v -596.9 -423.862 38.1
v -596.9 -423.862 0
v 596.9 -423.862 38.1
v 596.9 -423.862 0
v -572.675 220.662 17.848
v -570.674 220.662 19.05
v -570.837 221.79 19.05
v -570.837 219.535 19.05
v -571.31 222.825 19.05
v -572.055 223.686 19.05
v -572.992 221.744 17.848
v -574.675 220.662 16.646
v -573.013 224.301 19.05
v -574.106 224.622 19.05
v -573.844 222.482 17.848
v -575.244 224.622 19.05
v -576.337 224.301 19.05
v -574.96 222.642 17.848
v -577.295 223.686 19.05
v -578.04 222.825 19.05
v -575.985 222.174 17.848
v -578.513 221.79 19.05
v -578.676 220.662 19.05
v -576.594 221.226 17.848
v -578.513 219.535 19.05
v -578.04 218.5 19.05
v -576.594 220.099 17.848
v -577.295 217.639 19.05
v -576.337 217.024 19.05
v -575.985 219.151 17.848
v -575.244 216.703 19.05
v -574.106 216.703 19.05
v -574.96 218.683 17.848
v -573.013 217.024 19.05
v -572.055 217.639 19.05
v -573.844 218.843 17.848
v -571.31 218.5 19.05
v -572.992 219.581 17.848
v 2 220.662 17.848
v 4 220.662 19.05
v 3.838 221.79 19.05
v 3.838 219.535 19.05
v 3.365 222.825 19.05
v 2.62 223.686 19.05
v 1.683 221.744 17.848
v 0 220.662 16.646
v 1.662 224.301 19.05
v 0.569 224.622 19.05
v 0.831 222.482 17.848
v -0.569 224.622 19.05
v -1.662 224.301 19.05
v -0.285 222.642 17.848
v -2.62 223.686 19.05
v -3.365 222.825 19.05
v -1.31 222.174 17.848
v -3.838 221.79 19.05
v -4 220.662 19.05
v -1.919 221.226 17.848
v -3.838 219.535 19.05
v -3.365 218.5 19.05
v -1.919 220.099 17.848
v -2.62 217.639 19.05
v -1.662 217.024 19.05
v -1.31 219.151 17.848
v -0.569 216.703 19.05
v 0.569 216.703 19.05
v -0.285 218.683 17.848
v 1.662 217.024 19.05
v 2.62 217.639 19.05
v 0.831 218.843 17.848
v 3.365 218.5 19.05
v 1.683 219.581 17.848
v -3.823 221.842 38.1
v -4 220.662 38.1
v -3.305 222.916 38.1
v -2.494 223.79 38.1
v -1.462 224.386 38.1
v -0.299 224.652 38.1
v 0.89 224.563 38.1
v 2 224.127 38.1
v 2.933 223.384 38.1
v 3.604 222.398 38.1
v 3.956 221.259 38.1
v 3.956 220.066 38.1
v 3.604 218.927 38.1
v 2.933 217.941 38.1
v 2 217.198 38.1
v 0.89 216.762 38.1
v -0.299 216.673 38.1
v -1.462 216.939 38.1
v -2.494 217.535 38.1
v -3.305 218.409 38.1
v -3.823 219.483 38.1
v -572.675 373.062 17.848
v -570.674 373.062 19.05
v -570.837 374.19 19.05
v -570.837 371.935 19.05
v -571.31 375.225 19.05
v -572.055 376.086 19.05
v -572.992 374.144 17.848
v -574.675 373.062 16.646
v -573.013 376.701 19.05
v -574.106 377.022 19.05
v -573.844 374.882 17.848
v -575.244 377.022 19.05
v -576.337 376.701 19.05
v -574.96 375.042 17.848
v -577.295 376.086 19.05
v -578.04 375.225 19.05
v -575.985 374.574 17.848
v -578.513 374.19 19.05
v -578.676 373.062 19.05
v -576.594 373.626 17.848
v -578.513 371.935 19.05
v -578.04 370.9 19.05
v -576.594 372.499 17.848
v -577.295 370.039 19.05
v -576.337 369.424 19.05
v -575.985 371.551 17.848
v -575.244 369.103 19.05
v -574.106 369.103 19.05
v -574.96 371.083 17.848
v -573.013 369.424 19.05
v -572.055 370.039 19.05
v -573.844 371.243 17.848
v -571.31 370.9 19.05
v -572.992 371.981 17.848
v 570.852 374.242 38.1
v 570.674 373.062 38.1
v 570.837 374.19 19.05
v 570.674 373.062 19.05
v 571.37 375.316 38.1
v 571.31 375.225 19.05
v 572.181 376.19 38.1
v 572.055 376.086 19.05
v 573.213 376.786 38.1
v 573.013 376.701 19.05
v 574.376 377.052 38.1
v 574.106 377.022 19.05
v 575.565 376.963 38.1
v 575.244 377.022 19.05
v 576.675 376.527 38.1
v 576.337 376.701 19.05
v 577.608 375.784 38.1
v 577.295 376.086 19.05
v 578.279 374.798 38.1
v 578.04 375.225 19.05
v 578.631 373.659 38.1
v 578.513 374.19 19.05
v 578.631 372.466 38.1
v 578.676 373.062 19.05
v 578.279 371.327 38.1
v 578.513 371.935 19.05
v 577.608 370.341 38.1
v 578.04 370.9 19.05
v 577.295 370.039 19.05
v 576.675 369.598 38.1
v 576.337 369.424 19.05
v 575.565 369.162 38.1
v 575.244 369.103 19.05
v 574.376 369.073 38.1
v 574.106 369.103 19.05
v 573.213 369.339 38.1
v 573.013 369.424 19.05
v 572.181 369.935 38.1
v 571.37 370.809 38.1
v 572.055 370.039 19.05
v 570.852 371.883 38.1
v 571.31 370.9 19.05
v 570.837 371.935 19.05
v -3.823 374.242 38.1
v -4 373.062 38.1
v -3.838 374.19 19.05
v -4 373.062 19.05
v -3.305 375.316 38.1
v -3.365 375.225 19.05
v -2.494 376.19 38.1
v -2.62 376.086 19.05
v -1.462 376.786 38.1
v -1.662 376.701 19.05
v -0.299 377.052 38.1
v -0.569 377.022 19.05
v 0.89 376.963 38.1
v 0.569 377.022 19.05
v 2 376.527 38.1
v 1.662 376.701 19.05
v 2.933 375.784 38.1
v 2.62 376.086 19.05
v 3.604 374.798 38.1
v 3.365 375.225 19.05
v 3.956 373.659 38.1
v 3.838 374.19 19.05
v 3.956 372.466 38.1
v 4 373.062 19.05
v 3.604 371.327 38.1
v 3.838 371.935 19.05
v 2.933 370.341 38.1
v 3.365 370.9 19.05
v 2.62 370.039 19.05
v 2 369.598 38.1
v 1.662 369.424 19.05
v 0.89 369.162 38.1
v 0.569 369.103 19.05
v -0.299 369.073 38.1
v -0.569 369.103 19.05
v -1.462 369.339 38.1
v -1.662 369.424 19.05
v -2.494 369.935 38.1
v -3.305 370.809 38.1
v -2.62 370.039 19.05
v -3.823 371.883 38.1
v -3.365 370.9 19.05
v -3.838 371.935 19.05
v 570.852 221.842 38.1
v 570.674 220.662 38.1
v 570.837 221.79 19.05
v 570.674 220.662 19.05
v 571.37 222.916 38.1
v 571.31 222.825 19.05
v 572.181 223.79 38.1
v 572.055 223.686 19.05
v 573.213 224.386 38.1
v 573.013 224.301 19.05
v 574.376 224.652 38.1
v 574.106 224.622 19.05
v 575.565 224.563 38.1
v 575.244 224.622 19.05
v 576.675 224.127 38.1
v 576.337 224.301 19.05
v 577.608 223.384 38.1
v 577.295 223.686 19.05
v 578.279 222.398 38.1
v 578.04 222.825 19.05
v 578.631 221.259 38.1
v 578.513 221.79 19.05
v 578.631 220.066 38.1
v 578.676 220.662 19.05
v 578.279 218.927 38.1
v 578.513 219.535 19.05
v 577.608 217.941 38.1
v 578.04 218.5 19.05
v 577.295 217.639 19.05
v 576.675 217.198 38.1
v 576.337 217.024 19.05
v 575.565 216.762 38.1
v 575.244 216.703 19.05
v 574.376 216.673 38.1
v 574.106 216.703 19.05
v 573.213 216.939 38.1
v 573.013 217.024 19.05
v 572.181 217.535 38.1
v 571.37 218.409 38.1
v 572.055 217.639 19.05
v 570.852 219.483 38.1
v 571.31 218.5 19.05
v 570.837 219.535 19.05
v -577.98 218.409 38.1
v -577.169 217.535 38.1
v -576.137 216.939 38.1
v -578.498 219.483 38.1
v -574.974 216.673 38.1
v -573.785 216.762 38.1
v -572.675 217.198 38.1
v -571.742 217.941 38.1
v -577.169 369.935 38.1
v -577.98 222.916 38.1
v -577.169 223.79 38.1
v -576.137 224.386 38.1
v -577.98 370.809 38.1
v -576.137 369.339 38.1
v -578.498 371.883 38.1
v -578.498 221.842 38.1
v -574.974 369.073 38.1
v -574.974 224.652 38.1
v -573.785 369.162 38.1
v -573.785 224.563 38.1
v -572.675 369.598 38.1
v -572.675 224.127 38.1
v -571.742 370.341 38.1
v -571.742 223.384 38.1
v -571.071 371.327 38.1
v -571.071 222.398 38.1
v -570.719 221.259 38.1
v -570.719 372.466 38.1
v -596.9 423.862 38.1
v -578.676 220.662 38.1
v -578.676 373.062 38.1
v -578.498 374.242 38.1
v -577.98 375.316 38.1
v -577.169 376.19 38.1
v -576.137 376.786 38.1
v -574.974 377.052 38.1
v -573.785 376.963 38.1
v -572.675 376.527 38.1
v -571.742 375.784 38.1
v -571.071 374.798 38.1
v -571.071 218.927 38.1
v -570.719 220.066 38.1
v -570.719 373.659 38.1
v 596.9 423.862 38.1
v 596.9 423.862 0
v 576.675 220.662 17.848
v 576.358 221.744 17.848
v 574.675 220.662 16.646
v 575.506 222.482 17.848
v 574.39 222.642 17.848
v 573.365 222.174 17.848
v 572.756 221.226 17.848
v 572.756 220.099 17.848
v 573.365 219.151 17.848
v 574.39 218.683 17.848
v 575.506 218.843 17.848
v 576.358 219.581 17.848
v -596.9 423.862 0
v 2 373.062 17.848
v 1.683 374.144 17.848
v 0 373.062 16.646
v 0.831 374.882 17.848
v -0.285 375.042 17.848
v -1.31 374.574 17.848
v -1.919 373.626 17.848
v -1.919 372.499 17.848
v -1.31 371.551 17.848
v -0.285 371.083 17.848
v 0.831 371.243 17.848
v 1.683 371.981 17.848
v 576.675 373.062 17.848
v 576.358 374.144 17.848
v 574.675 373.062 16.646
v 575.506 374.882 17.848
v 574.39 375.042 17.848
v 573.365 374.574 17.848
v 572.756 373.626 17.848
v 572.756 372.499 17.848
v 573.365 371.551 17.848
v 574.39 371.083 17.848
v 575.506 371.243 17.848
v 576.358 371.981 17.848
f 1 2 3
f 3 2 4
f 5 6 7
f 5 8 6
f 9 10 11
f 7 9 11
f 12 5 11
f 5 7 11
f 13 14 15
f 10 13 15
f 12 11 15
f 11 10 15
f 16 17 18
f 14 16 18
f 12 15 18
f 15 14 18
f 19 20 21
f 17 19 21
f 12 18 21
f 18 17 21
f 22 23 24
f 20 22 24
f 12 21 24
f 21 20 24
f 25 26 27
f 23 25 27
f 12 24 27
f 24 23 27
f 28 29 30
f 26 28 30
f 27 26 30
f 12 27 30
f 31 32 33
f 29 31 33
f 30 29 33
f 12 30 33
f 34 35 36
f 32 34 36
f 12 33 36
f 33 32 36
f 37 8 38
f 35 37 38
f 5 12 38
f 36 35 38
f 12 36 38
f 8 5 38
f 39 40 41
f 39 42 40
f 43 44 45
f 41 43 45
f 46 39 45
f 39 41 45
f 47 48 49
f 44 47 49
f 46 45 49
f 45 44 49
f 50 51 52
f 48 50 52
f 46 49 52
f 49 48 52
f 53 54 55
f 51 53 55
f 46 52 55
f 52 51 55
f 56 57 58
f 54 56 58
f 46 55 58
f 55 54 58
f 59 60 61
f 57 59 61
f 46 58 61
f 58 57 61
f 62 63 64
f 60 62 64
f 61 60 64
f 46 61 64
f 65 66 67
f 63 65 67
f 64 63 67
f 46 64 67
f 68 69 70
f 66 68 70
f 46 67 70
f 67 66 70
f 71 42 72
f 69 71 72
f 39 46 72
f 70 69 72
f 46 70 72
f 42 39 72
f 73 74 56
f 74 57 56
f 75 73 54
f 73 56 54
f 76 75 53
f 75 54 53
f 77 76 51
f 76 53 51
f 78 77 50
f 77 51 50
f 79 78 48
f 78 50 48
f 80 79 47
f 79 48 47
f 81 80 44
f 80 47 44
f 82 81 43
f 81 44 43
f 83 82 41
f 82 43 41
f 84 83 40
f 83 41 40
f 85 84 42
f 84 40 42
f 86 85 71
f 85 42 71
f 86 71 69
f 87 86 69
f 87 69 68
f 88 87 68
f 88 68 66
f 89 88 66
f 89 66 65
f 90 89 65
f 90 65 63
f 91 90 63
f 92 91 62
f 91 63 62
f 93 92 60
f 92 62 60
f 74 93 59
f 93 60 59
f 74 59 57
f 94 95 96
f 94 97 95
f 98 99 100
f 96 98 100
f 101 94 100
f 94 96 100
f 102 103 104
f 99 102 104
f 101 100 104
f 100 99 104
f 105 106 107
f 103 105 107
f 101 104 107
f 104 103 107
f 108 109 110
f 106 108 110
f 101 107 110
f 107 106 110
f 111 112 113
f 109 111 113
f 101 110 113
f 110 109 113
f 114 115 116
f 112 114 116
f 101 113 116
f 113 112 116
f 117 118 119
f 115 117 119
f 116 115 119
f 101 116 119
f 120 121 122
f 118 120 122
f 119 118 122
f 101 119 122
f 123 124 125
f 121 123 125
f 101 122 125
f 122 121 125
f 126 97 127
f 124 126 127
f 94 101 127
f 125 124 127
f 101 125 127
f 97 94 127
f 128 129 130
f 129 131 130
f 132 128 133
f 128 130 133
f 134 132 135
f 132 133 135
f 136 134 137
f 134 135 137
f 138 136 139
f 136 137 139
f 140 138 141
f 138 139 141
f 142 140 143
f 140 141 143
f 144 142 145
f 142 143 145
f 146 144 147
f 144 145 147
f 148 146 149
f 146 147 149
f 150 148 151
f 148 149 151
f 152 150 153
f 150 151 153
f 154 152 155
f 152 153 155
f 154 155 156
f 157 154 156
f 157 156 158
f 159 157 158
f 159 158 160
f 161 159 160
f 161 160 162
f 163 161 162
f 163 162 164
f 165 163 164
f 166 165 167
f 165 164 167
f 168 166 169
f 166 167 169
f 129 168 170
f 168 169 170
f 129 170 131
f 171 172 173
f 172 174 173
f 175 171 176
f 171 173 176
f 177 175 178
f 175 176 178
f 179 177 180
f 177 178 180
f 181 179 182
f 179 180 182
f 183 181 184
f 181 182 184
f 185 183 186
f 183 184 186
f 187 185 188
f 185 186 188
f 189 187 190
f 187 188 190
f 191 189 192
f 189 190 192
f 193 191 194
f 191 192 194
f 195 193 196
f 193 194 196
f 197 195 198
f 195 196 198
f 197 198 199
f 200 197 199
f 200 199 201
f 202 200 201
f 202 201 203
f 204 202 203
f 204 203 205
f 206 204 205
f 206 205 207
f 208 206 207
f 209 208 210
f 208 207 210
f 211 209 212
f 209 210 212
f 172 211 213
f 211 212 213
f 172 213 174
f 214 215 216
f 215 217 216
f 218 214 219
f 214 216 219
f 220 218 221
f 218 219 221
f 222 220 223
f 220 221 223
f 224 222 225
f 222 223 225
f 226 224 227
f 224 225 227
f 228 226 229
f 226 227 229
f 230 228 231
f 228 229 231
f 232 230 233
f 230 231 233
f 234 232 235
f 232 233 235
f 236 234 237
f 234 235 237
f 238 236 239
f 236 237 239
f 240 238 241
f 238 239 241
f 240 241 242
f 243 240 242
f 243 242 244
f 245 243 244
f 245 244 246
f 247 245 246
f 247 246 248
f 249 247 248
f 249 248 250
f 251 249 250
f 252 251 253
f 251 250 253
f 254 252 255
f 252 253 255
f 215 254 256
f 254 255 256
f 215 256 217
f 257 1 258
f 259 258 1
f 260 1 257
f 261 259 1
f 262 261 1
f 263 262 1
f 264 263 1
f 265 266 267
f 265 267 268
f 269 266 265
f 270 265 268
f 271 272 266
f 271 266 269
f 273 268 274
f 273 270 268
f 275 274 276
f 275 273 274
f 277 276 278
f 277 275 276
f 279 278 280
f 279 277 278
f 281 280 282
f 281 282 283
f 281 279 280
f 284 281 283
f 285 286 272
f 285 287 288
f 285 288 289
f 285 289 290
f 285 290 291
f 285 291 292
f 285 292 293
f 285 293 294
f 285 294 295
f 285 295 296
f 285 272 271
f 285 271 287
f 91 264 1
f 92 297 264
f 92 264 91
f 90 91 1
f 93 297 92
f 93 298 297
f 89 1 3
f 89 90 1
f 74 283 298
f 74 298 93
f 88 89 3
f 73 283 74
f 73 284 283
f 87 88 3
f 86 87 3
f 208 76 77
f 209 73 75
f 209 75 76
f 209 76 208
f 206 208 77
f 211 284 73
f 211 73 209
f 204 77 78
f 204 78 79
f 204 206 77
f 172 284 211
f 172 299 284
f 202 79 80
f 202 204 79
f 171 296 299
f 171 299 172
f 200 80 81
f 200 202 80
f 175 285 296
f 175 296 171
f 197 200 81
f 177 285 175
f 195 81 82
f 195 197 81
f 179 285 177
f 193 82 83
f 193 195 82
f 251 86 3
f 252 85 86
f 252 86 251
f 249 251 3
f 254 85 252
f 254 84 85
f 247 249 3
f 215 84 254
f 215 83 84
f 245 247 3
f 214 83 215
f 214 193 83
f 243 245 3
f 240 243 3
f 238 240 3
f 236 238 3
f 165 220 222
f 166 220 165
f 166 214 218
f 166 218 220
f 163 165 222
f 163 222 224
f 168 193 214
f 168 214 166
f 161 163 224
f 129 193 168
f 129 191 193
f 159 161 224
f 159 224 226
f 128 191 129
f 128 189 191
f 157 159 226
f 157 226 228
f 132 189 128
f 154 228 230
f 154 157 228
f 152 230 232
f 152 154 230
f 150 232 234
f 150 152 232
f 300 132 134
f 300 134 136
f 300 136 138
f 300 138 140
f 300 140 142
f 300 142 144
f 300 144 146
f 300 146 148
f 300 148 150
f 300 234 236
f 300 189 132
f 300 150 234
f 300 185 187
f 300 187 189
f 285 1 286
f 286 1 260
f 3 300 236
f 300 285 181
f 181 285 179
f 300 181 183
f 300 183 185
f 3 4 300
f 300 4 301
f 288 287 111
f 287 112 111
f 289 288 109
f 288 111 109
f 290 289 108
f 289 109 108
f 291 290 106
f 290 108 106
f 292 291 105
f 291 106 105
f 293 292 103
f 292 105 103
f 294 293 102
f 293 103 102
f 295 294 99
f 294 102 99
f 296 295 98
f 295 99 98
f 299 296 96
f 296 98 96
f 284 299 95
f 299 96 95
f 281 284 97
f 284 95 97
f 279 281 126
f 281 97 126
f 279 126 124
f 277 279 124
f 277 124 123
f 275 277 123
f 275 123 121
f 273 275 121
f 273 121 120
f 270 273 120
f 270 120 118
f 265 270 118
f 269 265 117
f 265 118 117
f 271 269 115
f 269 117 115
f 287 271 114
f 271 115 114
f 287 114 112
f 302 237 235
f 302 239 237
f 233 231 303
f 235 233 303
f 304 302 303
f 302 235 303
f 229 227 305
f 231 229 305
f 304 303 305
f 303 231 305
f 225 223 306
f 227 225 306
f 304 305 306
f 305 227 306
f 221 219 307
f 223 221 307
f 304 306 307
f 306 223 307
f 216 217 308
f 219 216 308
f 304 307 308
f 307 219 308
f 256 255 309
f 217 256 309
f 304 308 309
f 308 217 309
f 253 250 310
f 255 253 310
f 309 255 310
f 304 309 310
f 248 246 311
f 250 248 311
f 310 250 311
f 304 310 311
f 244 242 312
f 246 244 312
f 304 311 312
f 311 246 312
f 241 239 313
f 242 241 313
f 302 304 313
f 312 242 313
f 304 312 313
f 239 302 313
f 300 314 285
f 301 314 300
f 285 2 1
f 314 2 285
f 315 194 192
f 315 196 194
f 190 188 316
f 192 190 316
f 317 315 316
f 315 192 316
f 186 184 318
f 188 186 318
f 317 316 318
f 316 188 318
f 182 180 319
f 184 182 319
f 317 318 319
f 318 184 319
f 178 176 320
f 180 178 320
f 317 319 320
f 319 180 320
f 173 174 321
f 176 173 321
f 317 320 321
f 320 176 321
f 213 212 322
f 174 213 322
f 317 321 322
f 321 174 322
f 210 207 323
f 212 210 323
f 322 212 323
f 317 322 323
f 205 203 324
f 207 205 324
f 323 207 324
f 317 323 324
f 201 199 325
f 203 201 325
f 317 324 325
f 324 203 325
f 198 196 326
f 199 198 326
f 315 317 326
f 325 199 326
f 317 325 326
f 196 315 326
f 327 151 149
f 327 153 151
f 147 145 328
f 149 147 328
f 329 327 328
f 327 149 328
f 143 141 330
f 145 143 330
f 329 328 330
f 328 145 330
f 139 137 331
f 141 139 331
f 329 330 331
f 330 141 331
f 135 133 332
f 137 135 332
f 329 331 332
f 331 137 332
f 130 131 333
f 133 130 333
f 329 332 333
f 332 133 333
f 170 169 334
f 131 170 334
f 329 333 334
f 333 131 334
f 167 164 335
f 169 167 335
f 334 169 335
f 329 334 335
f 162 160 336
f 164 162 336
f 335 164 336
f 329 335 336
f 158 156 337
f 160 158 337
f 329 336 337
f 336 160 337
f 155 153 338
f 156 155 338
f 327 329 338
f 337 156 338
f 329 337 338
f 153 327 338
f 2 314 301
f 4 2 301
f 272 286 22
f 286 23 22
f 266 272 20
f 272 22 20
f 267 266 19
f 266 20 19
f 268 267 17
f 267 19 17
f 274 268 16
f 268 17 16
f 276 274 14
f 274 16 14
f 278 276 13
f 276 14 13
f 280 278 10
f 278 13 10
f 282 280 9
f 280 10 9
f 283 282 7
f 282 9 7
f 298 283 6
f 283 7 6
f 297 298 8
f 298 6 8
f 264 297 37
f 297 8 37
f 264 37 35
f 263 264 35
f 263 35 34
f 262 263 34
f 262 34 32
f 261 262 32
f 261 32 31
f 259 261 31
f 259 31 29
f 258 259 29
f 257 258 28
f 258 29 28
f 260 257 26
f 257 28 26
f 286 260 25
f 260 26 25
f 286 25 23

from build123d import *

# Parameters (mm, degrees)
F0_W     = 1193.8
F0_H     = 847.725
F1_DEPTH = 38.1
F3_D     = 8.001
F3_DEPTH = 19.05
F3_TIP   = 2.4037429064


with BuildPart() as f1:
    # F0 (on Top) → F1 (new body)
    with BuildSketch(Plane.XY):
        Rectangle(F0_W, F0_H)
    extrude(amount=F1_DEPTH)

    # F3
    with Locations(Plane.XY.offset(38.1)):
        with Locations((-574.675, 373.0625), (-574.675, 220.6625), (0, 373.0625), (0, 220.6625), (574.675, 373.0625), (574.675, 220.6625)):
            Hole(F3_D / 2, depth=F3_DEPTH)
            with Locations((0, 0, -(F3_DEPTH + F3_TIP / 2))):  # 118° drill point
                Cone(0, F3_D / 2, F3_TIP, mode=Mode.SUBTRACT)


solid = f1.part
